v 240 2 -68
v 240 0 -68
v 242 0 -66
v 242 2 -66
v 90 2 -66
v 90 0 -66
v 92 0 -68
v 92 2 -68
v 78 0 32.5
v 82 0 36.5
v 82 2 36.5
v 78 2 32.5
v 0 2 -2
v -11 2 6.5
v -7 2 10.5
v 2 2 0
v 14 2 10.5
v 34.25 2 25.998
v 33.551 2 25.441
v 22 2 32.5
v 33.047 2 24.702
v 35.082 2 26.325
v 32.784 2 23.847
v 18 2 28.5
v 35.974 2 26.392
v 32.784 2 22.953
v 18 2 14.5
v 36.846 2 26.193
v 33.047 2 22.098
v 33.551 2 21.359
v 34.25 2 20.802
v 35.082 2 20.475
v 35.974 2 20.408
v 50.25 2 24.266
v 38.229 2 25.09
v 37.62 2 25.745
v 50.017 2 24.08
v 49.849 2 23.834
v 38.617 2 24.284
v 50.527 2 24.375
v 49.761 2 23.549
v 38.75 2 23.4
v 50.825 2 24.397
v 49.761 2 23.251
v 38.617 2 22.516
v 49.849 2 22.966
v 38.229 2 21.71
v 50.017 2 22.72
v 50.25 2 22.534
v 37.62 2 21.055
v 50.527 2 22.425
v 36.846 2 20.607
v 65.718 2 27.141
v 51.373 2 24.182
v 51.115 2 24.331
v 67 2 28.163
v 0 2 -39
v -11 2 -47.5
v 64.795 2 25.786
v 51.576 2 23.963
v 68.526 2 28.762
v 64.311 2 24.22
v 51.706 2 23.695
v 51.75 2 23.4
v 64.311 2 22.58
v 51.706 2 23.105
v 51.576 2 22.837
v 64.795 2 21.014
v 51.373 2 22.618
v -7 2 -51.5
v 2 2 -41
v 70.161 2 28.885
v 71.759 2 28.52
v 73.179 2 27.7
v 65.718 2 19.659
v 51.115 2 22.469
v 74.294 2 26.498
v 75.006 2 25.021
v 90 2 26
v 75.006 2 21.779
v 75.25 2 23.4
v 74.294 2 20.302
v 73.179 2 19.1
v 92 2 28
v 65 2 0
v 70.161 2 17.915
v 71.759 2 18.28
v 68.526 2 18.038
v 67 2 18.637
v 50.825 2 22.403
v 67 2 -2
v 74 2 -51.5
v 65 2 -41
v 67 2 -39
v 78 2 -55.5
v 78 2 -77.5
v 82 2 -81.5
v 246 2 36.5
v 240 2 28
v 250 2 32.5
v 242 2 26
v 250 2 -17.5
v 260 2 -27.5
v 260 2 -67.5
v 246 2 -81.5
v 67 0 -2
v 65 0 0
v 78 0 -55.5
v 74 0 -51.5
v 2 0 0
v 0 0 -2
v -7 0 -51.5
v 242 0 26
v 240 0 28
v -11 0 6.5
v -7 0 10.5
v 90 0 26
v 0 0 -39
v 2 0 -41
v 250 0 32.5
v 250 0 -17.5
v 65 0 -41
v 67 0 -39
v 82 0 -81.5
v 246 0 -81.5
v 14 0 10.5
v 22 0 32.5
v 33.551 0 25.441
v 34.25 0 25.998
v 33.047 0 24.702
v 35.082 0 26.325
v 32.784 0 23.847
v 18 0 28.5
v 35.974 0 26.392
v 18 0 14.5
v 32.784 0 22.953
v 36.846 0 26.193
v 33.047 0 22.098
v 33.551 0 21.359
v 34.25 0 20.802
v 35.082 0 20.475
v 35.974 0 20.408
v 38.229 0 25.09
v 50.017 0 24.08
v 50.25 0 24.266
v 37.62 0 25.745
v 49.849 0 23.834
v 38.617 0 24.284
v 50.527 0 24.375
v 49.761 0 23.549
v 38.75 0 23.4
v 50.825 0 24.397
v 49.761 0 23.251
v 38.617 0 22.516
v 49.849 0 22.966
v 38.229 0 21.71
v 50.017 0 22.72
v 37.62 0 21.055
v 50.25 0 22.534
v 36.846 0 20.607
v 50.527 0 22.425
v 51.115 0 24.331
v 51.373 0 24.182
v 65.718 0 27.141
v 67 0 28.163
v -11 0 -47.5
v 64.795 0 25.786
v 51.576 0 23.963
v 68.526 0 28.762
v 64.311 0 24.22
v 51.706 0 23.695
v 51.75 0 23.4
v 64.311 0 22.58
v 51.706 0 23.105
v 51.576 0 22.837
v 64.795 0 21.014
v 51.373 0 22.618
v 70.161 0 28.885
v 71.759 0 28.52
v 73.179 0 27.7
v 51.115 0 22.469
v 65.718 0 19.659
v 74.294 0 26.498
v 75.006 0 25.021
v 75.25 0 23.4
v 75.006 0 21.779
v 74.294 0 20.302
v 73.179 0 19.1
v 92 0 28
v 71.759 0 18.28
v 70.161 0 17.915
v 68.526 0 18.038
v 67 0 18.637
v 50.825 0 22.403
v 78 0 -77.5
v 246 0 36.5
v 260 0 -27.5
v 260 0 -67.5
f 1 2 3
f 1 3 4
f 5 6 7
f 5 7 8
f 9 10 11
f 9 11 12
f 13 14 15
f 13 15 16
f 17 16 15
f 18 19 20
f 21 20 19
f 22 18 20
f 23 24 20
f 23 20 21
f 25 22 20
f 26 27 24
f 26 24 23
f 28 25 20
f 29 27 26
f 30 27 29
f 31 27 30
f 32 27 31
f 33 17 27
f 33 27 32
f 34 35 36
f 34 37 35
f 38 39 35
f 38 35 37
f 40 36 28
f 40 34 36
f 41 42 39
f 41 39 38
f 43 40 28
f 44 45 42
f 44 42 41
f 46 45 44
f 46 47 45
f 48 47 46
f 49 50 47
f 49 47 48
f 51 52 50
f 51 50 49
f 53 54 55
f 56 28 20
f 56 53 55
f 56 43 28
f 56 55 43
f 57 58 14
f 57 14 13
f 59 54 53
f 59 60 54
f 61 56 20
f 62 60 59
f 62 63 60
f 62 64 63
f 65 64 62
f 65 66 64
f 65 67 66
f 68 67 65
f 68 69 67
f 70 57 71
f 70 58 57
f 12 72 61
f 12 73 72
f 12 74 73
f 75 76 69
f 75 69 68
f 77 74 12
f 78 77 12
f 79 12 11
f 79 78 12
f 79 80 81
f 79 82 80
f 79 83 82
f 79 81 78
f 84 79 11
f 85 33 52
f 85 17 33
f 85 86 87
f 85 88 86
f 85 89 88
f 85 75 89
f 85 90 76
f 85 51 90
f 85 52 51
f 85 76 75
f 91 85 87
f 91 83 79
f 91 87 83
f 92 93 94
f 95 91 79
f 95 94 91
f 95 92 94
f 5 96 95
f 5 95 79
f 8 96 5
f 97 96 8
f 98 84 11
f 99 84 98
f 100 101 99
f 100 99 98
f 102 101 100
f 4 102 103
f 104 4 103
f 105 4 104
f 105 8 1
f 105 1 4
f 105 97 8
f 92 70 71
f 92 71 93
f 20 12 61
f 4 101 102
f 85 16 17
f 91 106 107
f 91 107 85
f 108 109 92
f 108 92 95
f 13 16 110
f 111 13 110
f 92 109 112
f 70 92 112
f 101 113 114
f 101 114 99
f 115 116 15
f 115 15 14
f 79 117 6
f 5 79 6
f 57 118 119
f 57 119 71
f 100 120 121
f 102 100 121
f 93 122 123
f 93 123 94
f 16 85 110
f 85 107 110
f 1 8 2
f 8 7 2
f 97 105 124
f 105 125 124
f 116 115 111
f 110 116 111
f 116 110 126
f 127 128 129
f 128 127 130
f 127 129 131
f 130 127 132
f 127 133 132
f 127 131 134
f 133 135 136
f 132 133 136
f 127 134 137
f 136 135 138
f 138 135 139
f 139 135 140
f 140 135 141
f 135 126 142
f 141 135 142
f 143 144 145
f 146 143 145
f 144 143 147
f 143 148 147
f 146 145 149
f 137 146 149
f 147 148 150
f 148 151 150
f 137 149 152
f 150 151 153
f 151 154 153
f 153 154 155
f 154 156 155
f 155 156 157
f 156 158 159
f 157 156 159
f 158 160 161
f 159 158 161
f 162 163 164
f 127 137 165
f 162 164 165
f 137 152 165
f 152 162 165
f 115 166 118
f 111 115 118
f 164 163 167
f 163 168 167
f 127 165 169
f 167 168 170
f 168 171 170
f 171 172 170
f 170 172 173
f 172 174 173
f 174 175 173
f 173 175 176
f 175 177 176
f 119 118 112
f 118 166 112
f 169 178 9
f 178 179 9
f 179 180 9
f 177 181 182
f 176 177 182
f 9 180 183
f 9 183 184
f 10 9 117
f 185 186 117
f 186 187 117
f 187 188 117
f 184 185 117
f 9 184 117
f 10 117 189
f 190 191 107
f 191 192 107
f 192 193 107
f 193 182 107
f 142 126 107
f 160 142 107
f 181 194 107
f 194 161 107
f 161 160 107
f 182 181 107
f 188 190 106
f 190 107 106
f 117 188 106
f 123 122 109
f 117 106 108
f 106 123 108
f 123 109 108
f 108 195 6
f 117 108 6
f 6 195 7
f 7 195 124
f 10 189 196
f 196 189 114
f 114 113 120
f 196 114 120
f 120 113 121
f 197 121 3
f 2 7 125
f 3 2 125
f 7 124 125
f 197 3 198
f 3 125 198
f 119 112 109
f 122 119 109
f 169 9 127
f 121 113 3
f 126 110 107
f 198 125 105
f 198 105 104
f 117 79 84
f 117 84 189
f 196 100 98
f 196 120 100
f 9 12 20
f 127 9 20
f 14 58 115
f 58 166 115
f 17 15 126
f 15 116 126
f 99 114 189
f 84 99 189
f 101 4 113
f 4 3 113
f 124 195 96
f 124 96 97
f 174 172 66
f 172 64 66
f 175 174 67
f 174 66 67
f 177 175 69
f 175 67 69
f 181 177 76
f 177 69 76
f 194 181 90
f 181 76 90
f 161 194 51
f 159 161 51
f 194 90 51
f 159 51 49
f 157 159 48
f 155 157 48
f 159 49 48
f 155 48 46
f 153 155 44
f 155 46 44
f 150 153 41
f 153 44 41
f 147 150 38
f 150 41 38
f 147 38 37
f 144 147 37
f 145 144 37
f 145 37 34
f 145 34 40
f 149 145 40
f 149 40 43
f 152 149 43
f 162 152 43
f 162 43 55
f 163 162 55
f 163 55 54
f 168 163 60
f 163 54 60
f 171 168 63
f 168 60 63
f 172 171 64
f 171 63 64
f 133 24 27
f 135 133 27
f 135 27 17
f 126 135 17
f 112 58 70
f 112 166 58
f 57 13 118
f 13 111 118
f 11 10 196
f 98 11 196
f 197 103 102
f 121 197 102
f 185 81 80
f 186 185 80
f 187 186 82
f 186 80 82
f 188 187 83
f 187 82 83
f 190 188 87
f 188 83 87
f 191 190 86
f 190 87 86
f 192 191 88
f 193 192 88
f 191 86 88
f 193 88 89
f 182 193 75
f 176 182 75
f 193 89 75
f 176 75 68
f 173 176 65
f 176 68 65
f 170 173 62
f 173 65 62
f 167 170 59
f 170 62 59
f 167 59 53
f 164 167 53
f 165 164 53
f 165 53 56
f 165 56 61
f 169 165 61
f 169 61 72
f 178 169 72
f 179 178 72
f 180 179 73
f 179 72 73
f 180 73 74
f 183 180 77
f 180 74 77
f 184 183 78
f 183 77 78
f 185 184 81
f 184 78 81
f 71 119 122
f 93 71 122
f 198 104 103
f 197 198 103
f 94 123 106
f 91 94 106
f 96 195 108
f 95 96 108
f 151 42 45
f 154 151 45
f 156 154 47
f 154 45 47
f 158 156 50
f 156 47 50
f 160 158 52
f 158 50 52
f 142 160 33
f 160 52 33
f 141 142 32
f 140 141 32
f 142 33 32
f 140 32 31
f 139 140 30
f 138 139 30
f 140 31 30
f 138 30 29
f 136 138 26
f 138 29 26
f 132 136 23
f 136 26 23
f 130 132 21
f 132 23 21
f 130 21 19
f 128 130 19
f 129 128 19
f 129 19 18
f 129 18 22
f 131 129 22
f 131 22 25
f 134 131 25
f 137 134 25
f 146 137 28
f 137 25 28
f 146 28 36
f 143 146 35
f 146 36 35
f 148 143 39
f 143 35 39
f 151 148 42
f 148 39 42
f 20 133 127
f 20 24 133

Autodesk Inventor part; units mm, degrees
ref_plane "YZ Plane" through (0, 0, 0) normal (1, 0, 0) x (0, 1, 0)
ref_plane "XZ Plane" through (0, 0, 0) normal (0, 1, 0) x (-1, 0, 0)
ref_plane "XY Plane" through (0, 0, 0) normal (0, 0, 1) x (1, 0, 0)
sketch "Sketch1" plane through (0, 0, 0) normal (0, 1, 0) x (-1, 0, 0)
  line L0 (0, -41) -> (-67, -41)
  line L1 (-67, -41) -> (-67, 0)
  line L2 (-67, 0) -> (0, 0)
  line L3 (0, 0) -> (0, -41)
  line L4 (-90, -68) -> (-242, -68)
  line L5 (-242, -68) -> (-242, 28)
  line L6 (-242, 28) -> (-90, 28)
  line L7 (-90, 28) -> (-90, -68)
  line L8 (11, -47.5) -> (11, 6.5)
  line L9 (7, 10.5) -> (-74, 10.5)
  line L10 (-78, 14.5) -> (-78, 32.5)
  line L11 (-82, 36.5) -> (-246, 36.5)
  line L12 (-250, 32.5) -> (-250, -77.5)
  line L13 (-246, -81.5) -> (-82, -81.5)
  line L14 (-78, -77.5) -> (-78, -55.5)
  line L15 (-74, -51.5) -> (7, -51.5)
  line L16 (11, -47.5) -> (7, -51.5)
  line L17 (-74, -51.5) -> (-78, -55.5)
  line L18 (-78, -77.5) -> (-82, -81.5)
  line L19 (-246, -81.5) -> (-250, -77.5)
  line L20 (-250, 32.5) -> (-246, 36.5)
  line L21 (-82, 36.5) -> (-78, 32.5)
  line L22 (-78, 14.5) -> (-74, 10.5)
  line L23 (7, 10.5) -> (11, 6.5)
  line L24 (6, -46.5) -> (-73, -46.5) construction
  line L25 (-73, -46.5) -> (-73, 5.5) construction
  line L26 (-73, 5.5) -> (6, 5.5) construction
  line L27 (6, 5.5) -> (6, -46.5) construction
  line L28 (-83, -76.5) -> (-245, -76.5) construction
  line L29 (-245, -76.5) -> (-245, 31.5) construction
  line L30 (-245, 31.5) -> (-83, 31.5) construction
  line L31 (-83, 31.5) -> (-83, -76.5) construction
  point P0 (11, 10.5)
  point P1 (-78, 10.5)
  point P2 (-78, 36.5)
  point P3 (-250, 36.5)
  point P4 (-250, -81.5)
  point P5 (-78, -81.5)
  point P6 (-78, -51.5)
  point P7 (11, -51.5)
  point P8 (-33.5, -46.5)
  point P9 (-33.5, -41)
  point P10 (6, -20.5)
  point P11 (0, -20.5)
  point P12 (-83, -22.5)
  point P13 (-90, -20)
  point P14 (-164, -76.5)
  point P15 (-166, -68)
  dimension "d0" = 67
  dimension "d1" = 41
  dimension "d2" = 152
  dimension "d3" = 96
  dimension "d4" = 4
  dimension "d5" = 4
  dimension "d6" = 4
  dimension "d7" = 4
  dimension "d8" = 4
  dimension "d9" = 4
  dimension "d10" = 4
  dimension "d11" = 4
  dimension "d12" = 4
  dimension "d13" = 4
  dimension "d14" = 4
  dimension "d15" = 4
  dimension "d16" = 4
  dimension "d17" = 4
  dimension "d18" = 4
  dimension "d19" = 4
  dimension "d20" = 79
  dimension "d21" = 52
  dimension "d22" = 162
  dimension "d23" = 108
  dimension "d24" = 10
  dimension "d25" = 26
  dimension "d26" = 5
  dimension "d27" = 5
  dimension "d28" = 5
  dimension "d29" = 5
  dimension "d30" = 5
  dimension "d31" = 5
  dimension "d32" = 5
  dimension "d48" = 8.5
  dimension "d49" = 7
extrude "Extrusion1" add sketch "Sketch1" along normal blind 2
sketch "Sketch2" plane through (0, 2, 0) normal (0, 1, 0) x (1, 0, 0)
  line L0 (250, -32.5) -> (250, 77.5) projected
  line L1 (78, 55.5) -> (74, 51.5) projected
  line L2 (74, 51.5) -> (-7, 51.5) projected
  line L3 (250, 77.5) -> (260, 67.5)
  line L4 (260, 67.5) -> (260, 27.5)
  line L5 (260, 27.5) -> (250, 17.5)
  line L6 (250, 77.5) -> (250, 17.5)
  dimension "d35" = 10
  dimension "d36" = 40
extrude "Extrusion2" add sketch "Sketch2" against normal blind 2
sketch "Sketch3" plane through (0, 2, 0) normal (0, 1, 0) x (1, 0, 0)
  line L0 (-7, -10.5) -> (74, -10.5) projected
  line L1 (74, -10.5) -> (78, -14.5) projected
  line L2 (78, -14.5) -> (78, -32.5) projected
  line L3 (78, 55.5) -> (74, 51.5) projected
  line L4 (74, 51.5) -> (-7, 51.5) projected
  line L5 (78, -32.5) -> (22, -32.5)
  line L6 (18, -28.5) -> (18, -14.5)
  line L7 (18, -14.5) -> (14, -10.5)
  line L8 (18, -28.5) -> (22, -32.5)
  line L9 (14, -10.5) -> (74, -10.5)
  line L10 (74, -10.5) -> (78, -14.5)
  line L11 (78, -14.5) -> (78, -32.5)
  point P0 (18, -32.5)
  dimension "d39" = 4
  dimension "d40" = 4
  dimension "d41" = 4
  dimension "d42" = 60
extrude "Extrusion3" add sketch "Sketch3" against normal blind 2
chamfer "Chamfer1" distance 2 angle 45 8 edges at (0, 1, -41) (67, 1, -41) (90, 1, -68) (90, 1, 28) (0, 1, 0) (67, 1, 0) (242, 1, 28) (242, 1, -68)
sketch "Sketch4" plane through (0, 2, 0) normal (0, 1, 0) x (1, 0, 0)
  line L0 (18, -14.5) -> (18, -28.5) projected
  line L1 (22, -32.5) -> (78, -32.5) projected
  circle A0 centre (69.75, -23.4) radius 5.5
  circle A1 centre (50.75, -23.4) radius 1
  circle A2 centre (35.75, -23.4) radius 3
  point P0 (0, 0)
  dimension "d50" = 11
  dimension "d51" = 2
  dimension "d52" = 6
  dimension "d53" = 19
  dimension "d54" = 15
  dimension "d55" = 9.1
  dimension "d56" = 51.75
extrude "Extrusion4" cut sketch "Sketch4" against normal through all
equation "\"d5\" = d4"
equation "\"d6\" = d4"
equation "\"d7\" = d6"
equation "\"d8\" = d4"
equation "\"d9\" = d8"
equation "\"d10\" = d4"
equation "\"d11\" = d10"
equation "\"d12\" = d4"
equation "\"d13\" = d12"
equation "\"d14\" = d4"
equation "\"d15\" = d14"
equation "\"d16\" = d4"
equation "\"d17\" = d16"
equation "\"d18\" = d4"
equation "\"d19\" = d18"
equation "\"d26\" = 0.5 * d24"
equation "\"d27\" = d26"
equation "\"d28\" = d27"
equation "\"d29\" = d28"
equation "\"d30\" = d26"
equation "\"d31\" = d30"
equation "\"d32\" = d30"
equation "\"d41\" = d40"
properties part number "front_panel_frame" material "ABS Plastic"
